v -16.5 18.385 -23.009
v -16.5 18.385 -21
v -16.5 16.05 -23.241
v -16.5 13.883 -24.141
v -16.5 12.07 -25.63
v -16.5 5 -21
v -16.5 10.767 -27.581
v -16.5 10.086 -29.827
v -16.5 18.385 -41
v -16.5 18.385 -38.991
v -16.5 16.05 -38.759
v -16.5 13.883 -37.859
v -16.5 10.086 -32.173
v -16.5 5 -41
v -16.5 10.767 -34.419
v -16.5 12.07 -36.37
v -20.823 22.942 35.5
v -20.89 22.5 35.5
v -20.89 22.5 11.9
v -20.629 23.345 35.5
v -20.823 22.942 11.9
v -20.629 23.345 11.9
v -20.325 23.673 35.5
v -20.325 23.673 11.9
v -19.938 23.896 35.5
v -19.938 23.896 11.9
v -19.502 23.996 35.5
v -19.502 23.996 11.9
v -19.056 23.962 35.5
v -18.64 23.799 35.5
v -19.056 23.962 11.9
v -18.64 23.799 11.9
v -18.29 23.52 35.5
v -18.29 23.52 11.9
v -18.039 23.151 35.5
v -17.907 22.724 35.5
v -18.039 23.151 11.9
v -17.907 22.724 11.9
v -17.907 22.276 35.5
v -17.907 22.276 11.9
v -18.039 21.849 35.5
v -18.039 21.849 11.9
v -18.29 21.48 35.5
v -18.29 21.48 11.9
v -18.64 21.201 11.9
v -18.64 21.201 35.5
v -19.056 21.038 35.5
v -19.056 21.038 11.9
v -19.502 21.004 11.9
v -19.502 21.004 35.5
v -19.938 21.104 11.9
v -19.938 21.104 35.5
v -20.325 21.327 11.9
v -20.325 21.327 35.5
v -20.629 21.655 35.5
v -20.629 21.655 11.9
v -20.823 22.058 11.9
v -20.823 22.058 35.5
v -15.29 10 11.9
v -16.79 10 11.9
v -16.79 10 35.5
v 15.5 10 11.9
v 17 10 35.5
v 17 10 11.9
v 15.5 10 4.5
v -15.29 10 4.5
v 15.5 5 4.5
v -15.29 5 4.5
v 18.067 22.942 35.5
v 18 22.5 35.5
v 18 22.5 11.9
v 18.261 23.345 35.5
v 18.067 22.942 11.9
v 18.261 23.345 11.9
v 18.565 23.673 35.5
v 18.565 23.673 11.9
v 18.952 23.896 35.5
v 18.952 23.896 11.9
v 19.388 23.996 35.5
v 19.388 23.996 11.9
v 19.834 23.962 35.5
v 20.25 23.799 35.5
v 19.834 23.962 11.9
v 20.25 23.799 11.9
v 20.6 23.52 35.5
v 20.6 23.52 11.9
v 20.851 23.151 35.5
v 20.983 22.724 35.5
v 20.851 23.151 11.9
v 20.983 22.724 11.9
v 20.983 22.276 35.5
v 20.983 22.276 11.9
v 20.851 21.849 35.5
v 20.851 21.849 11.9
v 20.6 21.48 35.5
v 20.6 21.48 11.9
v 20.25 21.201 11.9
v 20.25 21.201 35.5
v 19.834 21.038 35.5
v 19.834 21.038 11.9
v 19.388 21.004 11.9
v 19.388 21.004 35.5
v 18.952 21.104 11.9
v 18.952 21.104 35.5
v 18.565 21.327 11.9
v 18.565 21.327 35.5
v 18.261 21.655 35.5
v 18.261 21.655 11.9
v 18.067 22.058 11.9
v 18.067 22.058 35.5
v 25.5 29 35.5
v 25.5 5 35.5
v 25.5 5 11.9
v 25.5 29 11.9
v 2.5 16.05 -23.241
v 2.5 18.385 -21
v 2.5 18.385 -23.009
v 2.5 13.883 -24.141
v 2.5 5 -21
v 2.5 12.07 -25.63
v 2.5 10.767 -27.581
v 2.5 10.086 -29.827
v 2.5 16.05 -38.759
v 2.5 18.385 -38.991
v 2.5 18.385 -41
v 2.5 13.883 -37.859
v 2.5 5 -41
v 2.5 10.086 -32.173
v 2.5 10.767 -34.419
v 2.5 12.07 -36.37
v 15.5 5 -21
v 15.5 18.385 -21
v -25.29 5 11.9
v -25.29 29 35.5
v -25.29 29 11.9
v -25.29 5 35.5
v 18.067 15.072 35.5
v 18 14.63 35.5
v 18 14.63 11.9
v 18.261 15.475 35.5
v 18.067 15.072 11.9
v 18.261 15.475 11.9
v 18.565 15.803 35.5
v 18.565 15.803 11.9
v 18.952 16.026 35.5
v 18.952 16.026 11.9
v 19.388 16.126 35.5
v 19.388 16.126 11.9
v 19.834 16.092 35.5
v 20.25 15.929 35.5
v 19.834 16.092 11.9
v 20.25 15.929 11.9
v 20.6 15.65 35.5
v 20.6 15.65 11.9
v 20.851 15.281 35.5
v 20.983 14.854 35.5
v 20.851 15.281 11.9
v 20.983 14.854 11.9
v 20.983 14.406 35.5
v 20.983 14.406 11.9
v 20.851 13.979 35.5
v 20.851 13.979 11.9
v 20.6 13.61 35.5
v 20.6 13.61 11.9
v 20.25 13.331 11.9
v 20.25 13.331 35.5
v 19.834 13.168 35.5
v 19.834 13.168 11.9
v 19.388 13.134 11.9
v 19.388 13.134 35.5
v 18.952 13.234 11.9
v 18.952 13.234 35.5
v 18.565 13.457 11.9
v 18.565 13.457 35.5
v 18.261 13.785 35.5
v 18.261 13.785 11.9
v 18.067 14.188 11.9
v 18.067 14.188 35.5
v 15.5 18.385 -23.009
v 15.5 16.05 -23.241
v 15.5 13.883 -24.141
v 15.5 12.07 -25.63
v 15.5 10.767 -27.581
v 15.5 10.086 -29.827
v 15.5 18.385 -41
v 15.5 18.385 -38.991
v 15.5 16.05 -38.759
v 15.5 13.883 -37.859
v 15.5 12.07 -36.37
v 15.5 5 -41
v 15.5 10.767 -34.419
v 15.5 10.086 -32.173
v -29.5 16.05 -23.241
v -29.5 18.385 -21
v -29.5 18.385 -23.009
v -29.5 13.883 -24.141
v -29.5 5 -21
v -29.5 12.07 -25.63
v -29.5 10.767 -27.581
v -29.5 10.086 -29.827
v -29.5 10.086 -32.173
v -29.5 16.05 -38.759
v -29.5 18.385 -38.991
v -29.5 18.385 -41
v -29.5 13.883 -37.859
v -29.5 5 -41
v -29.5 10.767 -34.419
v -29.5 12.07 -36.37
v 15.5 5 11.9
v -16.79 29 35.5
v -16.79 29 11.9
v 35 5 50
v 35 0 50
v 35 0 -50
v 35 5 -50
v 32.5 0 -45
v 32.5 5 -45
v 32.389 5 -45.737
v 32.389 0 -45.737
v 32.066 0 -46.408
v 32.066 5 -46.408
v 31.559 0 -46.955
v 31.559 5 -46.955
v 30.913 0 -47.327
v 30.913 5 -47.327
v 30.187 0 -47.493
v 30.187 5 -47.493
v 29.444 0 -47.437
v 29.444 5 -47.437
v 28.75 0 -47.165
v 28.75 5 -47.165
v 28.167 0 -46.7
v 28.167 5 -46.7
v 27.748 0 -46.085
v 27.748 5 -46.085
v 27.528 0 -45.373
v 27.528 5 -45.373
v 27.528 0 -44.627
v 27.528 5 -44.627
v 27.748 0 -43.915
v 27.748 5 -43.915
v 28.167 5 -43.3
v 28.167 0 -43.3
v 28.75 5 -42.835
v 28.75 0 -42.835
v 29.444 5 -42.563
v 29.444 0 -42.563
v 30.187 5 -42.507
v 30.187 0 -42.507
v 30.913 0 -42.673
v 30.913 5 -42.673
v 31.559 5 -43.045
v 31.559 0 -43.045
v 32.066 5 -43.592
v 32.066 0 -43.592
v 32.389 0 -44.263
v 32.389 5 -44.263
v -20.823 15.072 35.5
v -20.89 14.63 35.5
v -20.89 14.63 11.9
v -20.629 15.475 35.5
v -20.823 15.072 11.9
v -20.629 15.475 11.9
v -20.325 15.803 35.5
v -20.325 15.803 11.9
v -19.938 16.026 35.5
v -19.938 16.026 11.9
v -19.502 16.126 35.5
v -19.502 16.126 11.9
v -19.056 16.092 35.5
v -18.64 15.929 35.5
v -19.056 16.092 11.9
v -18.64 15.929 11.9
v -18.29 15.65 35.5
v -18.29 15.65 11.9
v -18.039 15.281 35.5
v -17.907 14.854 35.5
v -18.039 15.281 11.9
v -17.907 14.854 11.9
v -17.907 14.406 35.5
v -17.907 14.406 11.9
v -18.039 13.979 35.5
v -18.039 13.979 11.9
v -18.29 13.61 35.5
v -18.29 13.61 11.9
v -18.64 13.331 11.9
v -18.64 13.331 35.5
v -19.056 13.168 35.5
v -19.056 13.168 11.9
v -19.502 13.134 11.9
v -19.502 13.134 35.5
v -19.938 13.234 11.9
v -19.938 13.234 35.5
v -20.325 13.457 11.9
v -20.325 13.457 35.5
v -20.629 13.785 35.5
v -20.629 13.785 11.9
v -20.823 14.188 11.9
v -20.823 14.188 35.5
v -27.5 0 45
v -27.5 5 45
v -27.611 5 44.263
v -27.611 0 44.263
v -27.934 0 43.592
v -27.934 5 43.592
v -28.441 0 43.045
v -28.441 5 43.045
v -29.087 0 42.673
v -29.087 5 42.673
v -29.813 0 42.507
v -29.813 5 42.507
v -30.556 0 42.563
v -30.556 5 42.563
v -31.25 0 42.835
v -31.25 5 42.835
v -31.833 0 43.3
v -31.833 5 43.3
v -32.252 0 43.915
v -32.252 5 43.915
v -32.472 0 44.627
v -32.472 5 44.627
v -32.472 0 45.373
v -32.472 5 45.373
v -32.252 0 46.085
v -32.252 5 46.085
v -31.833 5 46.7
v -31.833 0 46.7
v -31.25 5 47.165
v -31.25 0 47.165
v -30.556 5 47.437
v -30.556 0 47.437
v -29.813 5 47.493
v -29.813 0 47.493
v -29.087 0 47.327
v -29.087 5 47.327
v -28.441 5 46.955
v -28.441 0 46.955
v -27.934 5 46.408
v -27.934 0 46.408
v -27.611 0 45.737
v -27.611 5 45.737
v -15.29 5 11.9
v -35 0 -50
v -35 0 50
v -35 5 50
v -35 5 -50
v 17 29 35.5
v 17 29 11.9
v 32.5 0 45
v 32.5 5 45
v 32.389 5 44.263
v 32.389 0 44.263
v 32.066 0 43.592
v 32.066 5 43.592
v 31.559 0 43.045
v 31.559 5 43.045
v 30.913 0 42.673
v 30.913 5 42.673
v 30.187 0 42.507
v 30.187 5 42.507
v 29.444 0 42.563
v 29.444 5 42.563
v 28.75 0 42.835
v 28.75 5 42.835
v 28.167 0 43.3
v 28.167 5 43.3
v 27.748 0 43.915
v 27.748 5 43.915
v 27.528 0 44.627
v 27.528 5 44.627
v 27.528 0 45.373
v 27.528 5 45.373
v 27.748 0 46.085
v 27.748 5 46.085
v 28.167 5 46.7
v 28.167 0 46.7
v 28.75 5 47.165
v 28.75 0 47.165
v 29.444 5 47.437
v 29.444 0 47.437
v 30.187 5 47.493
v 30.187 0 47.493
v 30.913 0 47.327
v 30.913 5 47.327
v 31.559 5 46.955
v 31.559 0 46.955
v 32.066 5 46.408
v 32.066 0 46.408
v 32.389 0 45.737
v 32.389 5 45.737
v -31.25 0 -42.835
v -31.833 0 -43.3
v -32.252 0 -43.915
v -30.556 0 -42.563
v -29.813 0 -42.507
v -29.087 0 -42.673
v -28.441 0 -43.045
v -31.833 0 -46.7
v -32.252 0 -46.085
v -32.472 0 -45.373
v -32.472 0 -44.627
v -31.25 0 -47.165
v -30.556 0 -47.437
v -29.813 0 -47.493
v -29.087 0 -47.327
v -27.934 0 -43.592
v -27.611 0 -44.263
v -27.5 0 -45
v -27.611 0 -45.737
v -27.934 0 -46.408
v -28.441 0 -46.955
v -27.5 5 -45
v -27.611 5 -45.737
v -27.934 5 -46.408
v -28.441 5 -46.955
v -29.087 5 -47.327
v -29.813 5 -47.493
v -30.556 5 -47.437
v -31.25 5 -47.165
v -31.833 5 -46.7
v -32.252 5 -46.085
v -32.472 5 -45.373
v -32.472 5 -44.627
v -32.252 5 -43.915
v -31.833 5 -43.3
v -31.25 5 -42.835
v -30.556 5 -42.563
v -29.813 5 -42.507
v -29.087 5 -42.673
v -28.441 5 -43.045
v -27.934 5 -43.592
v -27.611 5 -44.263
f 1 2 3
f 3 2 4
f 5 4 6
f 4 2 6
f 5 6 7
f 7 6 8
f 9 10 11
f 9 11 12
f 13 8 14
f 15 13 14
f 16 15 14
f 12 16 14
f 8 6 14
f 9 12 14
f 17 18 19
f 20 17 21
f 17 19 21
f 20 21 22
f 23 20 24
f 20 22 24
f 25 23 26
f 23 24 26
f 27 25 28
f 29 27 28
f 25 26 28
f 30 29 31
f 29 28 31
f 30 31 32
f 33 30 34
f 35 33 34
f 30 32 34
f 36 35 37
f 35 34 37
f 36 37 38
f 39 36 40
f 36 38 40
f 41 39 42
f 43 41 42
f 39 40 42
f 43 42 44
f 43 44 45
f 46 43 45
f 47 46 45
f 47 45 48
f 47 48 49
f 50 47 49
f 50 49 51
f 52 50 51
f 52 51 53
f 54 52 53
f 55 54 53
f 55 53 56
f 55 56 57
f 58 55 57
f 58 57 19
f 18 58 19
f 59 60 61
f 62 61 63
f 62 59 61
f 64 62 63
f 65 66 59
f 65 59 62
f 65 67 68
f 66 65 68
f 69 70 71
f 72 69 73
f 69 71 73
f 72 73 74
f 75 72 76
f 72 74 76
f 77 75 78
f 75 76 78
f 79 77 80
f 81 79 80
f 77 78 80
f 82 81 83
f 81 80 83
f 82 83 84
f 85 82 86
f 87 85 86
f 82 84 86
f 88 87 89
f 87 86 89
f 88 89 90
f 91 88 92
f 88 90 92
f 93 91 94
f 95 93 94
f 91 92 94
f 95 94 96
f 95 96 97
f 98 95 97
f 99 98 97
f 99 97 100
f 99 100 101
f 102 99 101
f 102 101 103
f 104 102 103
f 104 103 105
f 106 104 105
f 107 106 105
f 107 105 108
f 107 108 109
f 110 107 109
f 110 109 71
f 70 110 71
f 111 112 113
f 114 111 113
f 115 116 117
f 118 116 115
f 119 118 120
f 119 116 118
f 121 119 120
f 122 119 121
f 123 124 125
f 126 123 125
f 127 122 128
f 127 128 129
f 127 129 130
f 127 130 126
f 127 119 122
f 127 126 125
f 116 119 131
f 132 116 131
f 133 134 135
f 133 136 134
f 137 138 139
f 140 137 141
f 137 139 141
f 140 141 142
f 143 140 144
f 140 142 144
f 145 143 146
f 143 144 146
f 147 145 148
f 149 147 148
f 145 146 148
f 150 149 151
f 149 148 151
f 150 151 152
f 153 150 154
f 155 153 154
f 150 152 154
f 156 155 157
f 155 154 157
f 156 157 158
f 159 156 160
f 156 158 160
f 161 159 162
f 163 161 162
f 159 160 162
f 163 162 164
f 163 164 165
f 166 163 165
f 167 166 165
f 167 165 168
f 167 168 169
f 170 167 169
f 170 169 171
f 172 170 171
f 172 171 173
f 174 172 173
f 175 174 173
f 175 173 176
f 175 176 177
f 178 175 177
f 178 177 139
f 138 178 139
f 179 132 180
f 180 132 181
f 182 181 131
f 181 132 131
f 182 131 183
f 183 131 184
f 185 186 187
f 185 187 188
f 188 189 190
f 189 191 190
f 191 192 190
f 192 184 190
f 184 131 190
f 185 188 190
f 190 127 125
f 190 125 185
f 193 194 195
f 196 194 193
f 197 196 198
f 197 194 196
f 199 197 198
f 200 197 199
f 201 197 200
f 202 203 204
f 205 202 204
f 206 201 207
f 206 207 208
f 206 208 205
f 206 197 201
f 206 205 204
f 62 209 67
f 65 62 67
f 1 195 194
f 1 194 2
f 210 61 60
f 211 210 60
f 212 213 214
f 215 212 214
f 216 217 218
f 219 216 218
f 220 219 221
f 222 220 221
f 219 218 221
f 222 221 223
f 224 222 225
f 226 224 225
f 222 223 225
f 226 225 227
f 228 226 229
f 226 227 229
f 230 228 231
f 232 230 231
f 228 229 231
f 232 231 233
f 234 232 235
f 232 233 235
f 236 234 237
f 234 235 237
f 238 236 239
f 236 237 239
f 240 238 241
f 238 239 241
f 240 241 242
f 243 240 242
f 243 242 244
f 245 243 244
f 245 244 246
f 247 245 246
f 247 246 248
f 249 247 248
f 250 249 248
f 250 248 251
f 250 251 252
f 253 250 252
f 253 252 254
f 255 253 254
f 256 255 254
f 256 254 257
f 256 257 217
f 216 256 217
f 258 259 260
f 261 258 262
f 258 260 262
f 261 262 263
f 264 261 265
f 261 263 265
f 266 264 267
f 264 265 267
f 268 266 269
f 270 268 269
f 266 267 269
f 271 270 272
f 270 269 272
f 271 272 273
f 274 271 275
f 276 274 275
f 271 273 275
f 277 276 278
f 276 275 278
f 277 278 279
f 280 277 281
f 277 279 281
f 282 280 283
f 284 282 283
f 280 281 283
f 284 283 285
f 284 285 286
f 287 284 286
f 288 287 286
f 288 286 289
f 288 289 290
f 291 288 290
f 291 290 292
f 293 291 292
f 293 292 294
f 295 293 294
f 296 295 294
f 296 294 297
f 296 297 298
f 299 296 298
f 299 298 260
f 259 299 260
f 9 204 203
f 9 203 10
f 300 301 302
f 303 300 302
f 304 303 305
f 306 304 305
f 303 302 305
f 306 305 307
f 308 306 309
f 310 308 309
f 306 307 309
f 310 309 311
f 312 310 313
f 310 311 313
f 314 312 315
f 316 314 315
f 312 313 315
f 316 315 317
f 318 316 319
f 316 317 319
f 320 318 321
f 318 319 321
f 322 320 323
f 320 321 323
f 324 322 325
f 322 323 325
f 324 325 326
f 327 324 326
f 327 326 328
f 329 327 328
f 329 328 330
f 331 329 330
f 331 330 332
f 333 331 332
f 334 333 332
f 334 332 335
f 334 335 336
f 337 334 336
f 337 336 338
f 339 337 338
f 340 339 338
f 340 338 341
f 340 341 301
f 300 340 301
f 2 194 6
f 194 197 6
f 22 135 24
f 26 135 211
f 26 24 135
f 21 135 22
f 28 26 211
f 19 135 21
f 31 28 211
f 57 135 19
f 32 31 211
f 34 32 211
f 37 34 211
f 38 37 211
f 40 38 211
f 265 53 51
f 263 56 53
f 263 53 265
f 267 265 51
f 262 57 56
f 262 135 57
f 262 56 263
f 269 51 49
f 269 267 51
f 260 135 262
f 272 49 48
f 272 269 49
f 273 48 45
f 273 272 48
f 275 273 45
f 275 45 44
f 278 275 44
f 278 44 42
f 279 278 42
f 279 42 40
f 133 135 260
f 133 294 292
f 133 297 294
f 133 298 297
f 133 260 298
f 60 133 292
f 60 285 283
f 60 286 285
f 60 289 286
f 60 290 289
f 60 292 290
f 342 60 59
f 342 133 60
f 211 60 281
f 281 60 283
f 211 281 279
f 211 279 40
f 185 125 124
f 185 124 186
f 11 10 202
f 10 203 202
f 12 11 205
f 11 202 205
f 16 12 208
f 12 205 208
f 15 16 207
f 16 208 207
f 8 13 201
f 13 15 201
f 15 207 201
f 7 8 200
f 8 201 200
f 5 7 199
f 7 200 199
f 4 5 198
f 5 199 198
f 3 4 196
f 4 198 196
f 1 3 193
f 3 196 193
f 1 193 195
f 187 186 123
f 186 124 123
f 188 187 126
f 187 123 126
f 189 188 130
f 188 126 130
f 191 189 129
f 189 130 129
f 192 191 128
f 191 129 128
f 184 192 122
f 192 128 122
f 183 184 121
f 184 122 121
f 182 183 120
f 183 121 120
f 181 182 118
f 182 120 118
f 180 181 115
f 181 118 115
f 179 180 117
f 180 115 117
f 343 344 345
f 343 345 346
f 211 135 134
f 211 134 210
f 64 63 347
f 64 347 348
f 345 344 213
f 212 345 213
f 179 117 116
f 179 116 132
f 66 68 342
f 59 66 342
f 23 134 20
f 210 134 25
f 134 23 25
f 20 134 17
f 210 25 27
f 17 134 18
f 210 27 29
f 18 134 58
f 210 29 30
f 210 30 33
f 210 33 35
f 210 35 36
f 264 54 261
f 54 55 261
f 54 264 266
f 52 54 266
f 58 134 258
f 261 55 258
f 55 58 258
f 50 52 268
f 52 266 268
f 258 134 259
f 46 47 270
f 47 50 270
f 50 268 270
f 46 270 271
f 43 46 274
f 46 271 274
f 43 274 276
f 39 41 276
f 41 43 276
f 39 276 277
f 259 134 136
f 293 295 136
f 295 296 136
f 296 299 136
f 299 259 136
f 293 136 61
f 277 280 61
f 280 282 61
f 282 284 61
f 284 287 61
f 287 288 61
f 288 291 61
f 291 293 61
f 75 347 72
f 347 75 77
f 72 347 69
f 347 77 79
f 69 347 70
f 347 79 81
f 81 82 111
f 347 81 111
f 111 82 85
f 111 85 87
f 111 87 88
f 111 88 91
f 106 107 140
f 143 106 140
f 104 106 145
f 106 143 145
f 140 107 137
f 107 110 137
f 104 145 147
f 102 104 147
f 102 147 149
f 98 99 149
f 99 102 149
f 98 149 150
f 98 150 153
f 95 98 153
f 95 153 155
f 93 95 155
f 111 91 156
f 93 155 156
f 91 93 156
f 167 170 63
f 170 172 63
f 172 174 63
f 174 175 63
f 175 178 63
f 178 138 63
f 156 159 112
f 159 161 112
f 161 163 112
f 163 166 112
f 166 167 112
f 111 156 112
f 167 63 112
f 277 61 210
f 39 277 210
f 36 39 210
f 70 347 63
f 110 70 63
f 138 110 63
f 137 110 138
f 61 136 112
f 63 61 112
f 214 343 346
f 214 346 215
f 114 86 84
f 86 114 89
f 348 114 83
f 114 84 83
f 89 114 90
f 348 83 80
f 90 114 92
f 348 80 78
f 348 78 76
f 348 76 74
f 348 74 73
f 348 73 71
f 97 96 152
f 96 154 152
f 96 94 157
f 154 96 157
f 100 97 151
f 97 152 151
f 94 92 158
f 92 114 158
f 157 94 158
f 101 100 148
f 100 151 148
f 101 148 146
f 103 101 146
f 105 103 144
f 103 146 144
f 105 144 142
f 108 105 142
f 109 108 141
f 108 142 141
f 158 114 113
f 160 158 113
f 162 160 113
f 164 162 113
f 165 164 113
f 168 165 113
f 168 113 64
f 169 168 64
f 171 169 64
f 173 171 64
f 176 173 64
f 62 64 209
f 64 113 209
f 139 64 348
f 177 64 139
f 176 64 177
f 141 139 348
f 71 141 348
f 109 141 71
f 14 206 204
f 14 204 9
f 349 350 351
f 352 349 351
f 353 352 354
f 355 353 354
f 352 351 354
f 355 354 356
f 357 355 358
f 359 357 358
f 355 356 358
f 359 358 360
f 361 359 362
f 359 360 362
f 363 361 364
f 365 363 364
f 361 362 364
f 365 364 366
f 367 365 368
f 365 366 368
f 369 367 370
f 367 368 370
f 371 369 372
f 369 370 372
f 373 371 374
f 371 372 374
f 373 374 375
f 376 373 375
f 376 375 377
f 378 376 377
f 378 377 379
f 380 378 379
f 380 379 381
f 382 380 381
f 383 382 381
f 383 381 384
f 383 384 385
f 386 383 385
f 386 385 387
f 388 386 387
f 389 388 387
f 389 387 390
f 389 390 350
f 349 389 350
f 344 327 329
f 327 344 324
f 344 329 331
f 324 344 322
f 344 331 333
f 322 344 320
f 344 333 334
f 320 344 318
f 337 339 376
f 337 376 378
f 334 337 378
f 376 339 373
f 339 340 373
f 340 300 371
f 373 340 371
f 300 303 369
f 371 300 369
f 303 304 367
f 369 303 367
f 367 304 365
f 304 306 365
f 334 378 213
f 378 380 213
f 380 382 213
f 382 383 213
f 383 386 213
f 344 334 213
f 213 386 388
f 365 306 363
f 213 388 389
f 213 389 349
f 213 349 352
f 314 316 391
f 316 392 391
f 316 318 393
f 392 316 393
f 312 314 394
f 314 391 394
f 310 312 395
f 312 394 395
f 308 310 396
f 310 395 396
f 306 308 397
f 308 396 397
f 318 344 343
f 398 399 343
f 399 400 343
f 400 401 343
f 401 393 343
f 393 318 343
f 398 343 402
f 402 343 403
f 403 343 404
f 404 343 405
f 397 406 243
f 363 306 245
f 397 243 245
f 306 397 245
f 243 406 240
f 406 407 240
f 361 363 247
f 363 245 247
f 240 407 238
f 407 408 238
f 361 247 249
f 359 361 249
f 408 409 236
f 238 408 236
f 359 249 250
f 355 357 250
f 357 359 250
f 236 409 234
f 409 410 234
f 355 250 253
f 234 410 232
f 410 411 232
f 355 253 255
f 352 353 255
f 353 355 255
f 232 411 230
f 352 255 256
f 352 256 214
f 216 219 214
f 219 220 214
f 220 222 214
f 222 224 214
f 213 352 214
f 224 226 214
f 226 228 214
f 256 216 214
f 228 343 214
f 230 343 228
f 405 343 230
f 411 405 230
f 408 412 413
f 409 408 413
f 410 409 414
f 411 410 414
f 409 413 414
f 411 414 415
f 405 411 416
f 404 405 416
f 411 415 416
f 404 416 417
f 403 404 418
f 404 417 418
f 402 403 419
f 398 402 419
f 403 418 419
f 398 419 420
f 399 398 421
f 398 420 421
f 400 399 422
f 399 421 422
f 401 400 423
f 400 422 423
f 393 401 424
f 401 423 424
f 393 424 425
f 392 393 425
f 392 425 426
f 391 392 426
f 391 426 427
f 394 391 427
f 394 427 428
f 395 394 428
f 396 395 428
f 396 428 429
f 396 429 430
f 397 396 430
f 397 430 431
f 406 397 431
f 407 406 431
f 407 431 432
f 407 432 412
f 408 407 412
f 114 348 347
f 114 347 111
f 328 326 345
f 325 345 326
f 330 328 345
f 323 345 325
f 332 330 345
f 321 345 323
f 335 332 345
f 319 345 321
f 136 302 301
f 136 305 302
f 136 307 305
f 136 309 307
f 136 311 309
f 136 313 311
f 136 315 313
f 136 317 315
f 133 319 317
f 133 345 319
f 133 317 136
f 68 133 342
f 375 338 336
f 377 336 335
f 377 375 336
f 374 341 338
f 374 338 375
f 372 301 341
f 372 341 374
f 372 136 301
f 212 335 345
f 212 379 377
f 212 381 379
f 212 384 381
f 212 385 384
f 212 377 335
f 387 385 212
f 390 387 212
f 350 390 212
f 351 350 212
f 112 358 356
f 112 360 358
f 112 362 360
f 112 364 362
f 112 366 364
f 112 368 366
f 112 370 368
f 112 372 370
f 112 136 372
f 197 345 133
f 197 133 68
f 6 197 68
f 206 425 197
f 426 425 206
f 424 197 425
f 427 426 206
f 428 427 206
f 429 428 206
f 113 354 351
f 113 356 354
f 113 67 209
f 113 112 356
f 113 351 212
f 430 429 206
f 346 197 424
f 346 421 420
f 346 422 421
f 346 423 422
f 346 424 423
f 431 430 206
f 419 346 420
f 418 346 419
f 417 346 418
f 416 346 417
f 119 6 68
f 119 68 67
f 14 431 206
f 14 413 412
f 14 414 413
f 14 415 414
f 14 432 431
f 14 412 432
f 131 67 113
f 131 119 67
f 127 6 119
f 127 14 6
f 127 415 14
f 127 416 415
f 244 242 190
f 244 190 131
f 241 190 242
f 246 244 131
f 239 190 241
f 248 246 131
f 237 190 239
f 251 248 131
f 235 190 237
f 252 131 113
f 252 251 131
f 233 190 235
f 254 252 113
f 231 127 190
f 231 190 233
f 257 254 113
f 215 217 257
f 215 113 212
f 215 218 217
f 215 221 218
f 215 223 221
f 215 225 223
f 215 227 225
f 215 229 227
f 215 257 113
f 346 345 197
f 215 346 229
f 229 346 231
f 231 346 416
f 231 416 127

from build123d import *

# Parameters (mm, degrees)
SKETCH1_W           = 70
SKETCH1_H           = 100
BOSS_EXTRUDE1_DEPTH = 5
SKETCH2_W           = 13
SKETCH2_H           = 20
BOSS_EXTRUDE2_DEPTH = 5
SKETCH4_W           = 8.5
SKETCH4_H           = 23.6
BOSS_EXTRUDE3_DEPTH = 19
SKETCH5_R           = 1.5
CUT_EXTRUDE1_DEPTH  = 26
SKETCH6_W           = 13
SKETCH6_H           = 20
BOSS_EXTRUDE4_DEPTH = 8.385
SKETCH7_R           = 8
CUT_EXTRUDE2_DEPTH  = 63
CUT_EXTRUDE3_REACH  = 7
SKETCH8_R           = 2.5


with BuildPart() as part:
    # Sketch1 → Boss-Extrude1 (new body)
    with BuildSketch(Plane(origin=(0, 0, 0), x_dir=(1, 0, 0), z_dir=(0, 1, 0))):
        Rectangle(SKETCH1_W, SKETCH1_H)
    extrude(amount=BOSS_EXTRUDE1_DEPTH)

    # Sketch2 → Boss-Extrude2 (add)
    with BuildSketch(Plane(origin=(0, 5, 0), x_dir=(1, 0, 0), z_dir=(0, 1, 0))):
        Polygon((-15.28967138, -11.9), (-25.28967138, -11.9), (-25.28967138, -35.5), (25.5, -35.5), (25.5, -11.9), (15.5, -11.9), (15.5, -4.5), (-15.28967138, -4.5), align=None)
        with Locations((-23, 31)):
            Rectangle(SKETCH2_W, SKETCH2_H)
        with Locations((9, 31)):
            Rectangle(SKETCH2_W, SKETCH2_H)
    extrude(amount=BOSS_EXTRUDE2_DEPTH)

    # Sketch4 → Boss-Extrude3 (add)
    with BuildSketch(Plane(origin=(0, 10, 0), x_dir=(1, 0, 0), z_dir=(0, 1, 0))):
        with Locations((-21.03967138, -23.7)):
            Rectangle(SKETCH4_W, SKETCH4_H)
        with Locations((21.25, -23.7)):
            Rectangle(SKETCH4_W, SKETCH4_H)
    extrude(amount=BOSS_EXTRUDE3_DEPTH)

    # Sketch5 → Cut-Extrude1 (cut)
    with BuildSketch(Plane(origin=(0, 0, 11.9), x_dir=(-1, 0, 0), z_dir=(0, 0, -1))):
        with Locations((19.39, 22.5)):
            Circle(SKETCH5_R)
        with Locations((19.39, 14.63)):
            Circle(SKETCH5_R)
        with Locations((-19.5, 22.5)):
            Circle(SKETCH5_R)
        with Locations((-19.5, 14.63)):
            Circle(SKETCH5_R)
    extrude(amount=-CUT_EXTRUDE1_DEPTH, mode=Mode.SUBTRACT)

    # Sketch6 → Boss-Extrude4 (add)
    with BuildSketch(Plane(origin=(0, 10, 0), x_dir=(1, 0, 0), z_dir=(0, 1, 0))):
        with Locations((-23, 31)):
            Rectangle(SKETCH6_W, SKETCH6_H)
        with Locations((9, 31)):
            Rectangle(SKETCH6_W, SKETCH6_H)
    extrude(amount=BOSS_EXTRUDE4_DEPTH)

    # Sketch7 → Cut-Extrude2 (cut)
    with BuildSketch(Plane.ZY.offset(29.5)):
        with Locations((-31, 18)):
            Circle(SKETCH7_R)
    extrude(amount=-CUT_EXTRUDE2_DEPTH, mode=Mode.SUBTRACT)

    # Sketch8 → Cut-Extrude3 (cut, up to next)
    with BuildSketch(Plane(origin=(0, 5, 0), x_dir=(1, 0, 0), z_dir=(0, 1, 0)), mode=Mode.PRIVATE) as cut_extrude3_sk1:
        with Locations((30, 45)):
            Circle(SKETCH8_R)
    cut_extrude3_tool1 = extrude(cut_extrude3_sk1.sketch, amount=-CUT_EXTRUDE3_REACH, mode=Mode.PRIVATE) & part.part
    add(cut_extrude3_tool1.solids().sort_by_distance((30, 5, -45))[0], mode=Mode.SUBTRACT)
    # Sketch8 → Cut-Extrude3 (cut, up to next)
    with BuildSketch(Plane(origin=(0, 5, 0), x_dir=(1, 0, 0), z_dir=(0, 1, 0)), mode=Mode.PRIVATE) as cut_extrude3_sk2:
        with Locations((-30, 45)):
            Circle(SKETCH8_R)
    cut_extrude3_tool2 = extrude(cut_extrude3_sk2.sketch, amount=-CUT_EXTRUDE3_REACH, mode=Mode.PRIVATE) & part.part
    add(cut_extrude3_tool2.solids().sort_by_distance((-30, 5, -45))[0], mode=Mode.SUBTRACT)
    # Sketch8 → Cut-Extrude3 (cut, up to next)
    with BuildSketch(Plane(origin=(0, 5, 0), x_dir=(1, 0, 0), z_dir=(0, 1, 0)), mode=Mode.PRIVATE) as cut_extrude3_sk3:
        with Locations((-30, -45)):
            Circle(SKETCH8_R)
    cut_extrude3_tool3 = extrude(cut_extrude3_sk3.sketch, amount=-CUT_EXTRUDE3_REACH, mode=Mode.PRIVATE) & part.part
    add(cut_extrude3_tool3.solids().sort_by_distance((-30, 5, 45))[0], mode=Mode.SUBTRACT)
    # Sketch8 → Cut-Extrude3 (cut, up to next)
    with BuildSketch(Plane(origin=(0, 5, 0), x_dir=(1, 0, 0), z_dir=(0, 1, 0)), mode=Mode.PRIVATE) as cut_extrude3_sk4:
        with Locations((30, -45)):
            Circle(SKETCH8_R)
    cut_extrude3_tool4 = extrude(cut_extrude3_sk4.sketch, amount=-CUT_EXTRUDE3_REACH, mode=Mode.PRIVATE) & part.part
    add(cut_extrude3_tool4.solids().sort_by_distance((30, 5, 45))[0], mode=Mode.SUBTRACT)


solid = part.part
